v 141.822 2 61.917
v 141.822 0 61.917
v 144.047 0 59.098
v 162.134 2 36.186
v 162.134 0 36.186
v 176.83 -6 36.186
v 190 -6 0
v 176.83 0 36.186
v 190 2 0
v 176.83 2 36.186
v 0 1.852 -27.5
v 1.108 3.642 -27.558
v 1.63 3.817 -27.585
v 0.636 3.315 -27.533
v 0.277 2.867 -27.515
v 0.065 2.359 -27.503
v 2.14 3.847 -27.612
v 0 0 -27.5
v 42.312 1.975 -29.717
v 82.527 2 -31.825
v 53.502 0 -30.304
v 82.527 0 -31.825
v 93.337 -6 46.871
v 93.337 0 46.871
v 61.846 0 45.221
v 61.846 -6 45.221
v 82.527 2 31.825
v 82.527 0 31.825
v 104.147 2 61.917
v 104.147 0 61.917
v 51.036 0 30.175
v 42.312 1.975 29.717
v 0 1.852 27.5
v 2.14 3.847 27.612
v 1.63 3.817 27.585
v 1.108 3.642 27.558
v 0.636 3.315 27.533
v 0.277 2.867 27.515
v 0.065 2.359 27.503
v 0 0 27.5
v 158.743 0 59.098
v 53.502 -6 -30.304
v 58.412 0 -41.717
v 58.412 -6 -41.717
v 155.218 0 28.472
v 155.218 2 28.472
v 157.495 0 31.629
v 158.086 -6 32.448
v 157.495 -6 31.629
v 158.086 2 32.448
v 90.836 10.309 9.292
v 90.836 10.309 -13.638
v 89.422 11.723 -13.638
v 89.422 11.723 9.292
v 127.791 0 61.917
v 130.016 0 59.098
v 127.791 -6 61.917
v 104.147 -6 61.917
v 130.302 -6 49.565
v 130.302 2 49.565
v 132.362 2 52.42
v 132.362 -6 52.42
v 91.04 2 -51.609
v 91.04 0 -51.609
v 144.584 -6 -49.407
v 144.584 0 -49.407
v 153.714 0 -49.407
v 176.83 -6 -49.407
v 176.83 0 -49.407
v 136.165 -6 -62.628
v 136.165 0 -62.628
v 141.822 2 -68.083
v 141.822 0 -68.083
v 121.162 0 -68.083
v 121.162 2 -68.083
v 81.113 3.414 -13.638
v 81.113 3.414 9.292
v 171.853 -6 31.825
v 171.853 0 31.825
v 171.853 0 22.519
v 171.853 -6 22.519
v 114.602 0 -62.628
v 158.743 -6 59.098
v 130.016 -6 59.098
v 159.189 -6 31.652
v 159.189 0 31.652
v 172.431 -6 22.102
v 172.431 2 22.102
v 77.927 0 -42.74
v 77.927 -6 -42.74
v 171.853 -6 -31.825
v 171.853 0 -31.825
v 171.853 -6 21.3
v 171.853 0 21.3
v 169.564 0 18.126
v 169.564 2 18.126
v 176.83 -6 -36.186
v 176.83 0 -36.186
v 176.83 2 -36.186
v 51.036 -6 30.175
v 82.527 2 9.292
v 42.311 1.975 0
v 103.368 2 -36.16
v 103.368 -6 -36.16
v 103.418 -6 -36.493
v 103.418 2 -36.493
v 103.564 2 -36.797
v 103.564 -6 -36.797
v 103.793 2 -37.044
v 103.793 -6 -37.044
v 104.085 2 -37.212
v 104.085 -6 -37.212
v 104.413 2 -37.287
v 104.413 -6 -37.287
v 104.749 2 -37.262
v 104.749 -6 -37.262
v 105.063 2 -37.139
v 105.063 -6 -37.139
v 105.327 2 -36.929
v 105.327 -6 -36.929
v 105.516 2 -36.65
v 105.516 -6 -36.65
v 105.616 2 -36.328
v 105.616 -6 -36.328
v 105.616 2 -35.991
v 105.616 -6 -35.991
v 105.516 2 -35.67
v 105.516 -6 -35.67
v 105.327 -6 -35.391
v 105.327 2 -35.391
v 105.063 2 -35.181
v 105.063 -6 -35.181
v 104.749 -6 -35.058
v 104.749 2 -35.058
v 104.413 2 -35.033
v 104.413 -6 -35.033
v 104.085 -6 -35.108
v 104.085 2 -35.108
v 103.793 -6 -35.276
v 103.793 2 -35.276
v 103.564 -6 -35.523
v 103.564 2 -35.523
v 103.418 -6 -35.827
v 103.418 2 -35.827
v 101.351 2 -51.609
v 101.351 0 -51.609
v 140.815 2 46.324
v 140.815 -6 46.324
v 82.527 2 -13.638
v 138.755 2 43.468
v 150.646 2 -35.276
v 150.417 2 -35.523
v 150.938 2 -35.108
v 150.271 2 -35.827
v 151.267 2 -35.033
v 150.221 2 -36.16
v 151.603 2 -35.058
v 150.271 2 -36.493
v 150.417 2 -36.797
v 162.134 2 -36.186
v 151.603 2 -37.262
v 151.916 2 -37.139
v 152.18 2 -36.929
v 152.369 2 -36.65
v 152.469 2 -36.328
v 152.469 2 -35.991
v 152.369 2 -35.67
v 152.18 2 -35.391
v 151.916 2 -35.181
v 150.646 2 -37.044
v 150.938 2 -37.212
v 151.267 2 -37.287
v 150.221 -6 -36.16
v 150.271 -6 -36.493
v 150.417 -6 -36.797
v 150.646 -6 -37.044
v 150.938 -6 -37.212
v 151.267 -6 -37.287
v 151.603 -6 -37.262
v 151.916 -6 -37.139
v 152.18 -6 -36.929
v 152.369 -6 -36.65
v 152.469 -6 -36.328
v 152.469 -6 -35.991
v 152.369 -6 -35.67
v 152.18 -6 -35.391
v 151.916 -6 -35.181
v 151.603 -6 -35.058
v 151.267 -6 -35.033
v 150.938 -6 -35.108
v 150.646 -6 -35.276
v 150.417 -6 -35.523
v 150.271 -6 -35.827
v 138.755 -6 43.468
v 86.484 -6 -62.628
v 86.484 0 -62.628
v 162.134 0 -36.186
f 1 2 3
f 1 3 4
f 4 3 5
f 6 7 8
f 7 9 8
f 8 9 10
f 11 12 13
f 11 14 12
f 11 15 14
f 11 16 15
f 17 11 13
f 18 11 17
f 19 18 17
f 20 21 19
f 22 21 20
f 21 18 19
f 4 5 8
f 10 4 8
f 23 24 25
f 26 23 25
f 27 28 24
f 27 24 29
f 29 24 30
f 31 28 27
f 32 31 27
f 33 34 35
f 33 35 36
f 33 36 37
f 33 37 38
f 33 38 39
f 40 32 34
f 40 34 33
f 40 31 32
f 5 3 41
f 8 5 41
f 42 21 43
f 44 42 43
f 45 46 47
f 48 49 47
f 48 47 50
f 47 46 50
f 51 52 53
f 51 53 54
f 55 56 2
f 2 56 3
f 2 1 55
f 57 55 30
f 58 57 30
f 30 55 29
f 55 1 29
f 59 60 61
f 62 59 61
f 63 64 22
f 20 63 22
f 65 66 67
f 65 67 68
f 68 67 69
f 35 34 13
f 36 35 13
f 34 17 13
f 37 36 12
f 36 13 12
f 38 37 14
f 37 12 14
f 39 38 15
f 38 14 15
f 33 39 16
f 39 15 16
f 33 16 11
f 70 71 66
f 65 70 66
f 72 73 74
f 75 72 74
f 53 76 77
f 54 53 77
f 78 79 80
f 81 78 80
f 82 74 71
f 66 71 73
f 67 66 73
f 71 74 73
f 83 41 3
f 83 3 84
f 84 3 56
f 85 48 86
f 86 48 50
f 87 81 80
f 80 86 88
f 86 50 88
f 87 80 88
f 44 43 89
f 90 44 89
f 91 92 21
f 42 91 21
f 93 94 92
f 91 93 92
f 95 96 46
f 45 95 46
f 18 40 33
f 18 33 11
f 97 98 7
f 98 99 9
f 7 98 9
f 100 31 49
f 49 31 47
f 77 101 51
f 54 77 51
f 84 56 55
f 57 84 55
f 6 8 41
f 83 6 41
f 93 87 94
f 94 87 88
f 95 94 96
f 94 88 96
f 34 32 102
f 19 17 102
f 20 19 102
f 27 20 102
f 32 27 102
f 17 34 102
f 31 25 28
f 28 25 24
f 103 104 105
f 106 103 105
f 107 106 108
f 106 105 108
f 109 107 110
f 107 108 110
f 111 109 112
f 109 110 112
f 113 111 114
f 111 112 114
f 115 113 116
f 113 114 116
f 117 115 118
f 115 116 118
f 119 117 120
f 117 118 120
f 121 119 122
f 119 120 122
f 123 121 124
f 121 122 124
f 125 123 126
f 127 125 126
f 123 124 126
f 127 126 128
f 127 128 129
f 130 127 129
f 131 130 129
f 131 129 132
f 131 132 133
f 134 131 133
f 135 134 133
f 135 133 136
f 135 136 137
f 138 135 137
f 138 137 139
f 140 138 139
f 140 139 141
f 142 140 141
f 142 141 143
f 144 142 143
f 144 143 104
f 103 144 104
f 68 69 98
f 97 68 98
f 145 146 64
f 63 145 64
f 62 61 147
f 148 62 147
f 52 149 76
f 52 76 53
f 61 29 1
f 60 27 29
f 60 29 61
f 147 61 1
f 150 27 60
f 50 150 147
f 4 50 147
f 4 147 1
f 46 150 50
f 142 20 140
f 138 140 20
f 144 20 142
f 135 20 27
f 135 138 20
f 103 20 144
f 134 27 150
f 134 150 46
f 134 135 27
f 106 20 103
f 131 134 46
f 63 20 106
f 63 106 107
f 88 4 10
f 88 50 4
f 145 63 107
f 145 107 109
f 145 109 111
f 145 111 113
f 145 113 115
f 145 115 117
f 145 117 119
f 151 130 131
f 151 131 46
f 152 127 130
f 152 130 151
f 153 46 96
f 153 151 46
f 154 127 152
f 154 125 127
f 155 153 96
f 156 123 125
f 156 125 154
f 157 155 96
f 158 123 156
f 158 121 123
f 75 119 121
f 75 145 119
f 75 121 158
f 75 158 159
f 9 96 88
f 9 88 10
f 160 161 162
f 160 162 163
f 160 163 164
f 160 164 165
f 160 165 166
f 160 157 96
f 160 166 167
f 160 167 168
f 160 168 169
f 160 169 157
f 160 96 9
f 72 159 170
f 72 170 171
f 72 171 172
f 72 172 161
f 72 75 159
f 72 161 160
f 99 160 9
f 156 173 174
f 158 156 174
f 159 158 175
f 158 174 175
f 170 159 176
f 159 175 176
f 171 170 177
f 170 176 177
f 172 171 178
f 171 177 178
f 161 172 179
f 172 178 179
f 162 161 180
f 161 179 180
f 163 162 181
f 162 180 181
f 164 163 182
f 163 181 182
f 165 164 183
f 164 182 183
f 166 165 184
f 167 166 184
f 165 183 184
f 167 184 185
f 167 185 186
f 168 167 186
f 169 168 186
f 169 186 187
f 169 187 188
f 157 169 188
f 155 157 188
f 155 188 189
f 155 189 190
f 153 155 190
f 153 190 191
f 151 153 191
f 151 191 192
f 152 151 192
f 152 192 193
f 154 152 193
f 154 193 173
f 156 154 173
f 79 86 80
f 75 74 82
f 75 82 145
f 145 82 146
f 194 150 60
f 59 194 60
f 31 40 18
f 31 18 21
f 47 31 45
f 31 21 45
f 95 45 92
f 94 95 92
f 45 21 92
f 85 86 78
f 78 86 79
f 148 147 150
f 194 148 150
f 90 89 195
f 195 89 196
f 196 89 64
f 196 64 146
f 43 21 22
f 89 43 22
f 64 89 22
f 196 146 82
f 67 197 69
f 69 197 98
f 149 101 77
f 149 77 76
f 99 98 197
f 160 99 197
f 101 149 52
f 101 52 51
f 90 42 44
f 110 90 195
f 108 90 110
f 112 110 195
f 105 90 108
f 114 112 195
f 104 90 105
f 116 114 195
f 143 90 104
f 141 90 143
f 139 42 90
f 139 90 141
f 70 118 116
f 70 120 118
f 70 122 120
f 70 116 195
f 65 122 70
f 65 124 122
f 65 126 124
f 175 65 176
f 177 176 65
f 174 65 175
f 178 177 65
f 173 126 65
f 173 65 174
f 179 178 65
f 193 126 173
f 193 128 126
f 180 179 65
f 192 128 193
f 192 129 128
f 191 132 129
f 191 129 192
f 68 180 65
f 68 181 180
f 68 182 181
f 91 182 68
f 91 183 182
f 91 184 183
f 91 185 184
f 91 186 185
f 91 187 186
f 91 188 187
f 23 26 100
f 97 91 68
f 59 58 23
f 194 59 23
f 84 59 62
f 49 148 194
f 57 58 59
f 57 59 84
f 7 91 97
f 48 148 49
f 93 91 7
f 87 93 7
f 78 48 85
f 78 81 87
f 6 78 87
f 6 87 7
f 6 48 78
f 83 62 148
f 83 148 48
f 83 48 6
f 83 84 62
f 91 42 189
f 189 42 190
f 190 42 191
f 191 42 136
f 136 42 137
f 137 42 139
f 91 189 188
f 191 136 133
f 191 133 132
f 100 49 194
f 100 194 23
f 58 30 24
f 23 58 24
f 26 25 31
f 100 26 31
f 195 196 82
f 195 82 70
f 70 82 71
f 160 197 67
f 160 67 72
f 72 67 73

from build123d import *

# Parameters (mm, degrees)
EXTRUDE_1_DEPTH          = 2
EXTRUDE_2_DEPTH          = 2
CUT_EXTRUDE_3_DEPTH      = 202.869395429
CUT_EXTRUDE_3_DEPTH_BACK = 202.869395429
FILLET_1_R               = 2
EXTRUDE_4_DEPTH          = 6
HOLE_WIZARD_4_40_2_D     = 2.2606
CUT_EXTRUDE_7_DEPTH      = 202.98824919
EXTRUDE_5_DEPTH          = 2


with BuildPart() as part:
    # 草图2 → 凸台-拉伸1 (new body)
    with BuildSketch(Plane(origin=(0, 0, 0), x_dir=(1, 0, 0), z_dir=(0, 1, 0))):
        Polygon((141.821582241, 68.082690978), (121.161879345, 68.082690978), (101.35099463, 51.608897425), (91.039832206, 51.608897425), (82.527346571, 31.825074964), (0, 27.5), (0, -27.5), (82.527346571, -31.825074964), (104.14664553, -61.917309022), (141.821582241, -61.917309022), (162.133732132, -36.18552755), (176.829545061, -36.18552755), (190, 0), (176.829545061, 36.18552755), (162.133732132, 36.18552755), align=None)
    extrude(amount=EXTRUDE_1_DEPTH)

    # 草图6 → 凸台-拉伸2 (add)
    with BuildSketch(Plane(origin=(0, 2, 0), x_dir=(1, 0, 0), z_dir=(0, 1, 0))):
        Polygon((82.527346571, 31.825074964), (82.527346571, -31.825074964), (0, -27.5), (0, 27.5), align=None)
    extrude(amount=EXTRUDE_2_DEPTH)

    # 草图7 → 切除-拉伸3 (cut, two sides: drawn at the far end of the back side and taken through both)
    with BuildSketch(Plane.XY.offset(-CUT_EXTRUDE_3_DEPTH_BACK)):
        with BuildLine():
            Line((82.527346571, 2), (82.527346571, 30.740821148))
            Line((82.527346571, 30.740821148), (0, 4))
            add(Edge.make_bspline(
                [(82.527346571, 2), (41.215261335, 1.001172546), (0, 4)],
                knots=[0, 0, 0, 1, 1, 1], degree=2))
        make_face()
    extrude(amount=CUT_EXTRUDE_3_DEPTH + CUT_EXTRUDE_3_DEPTH_BACK, mode=Mode.SUBTRACT)

    # 圆角1
    fillet_1_edges = [part.edges().sort_by_distance(p)[0] for p in [
        (0, 4, 13.75),
    ]]
    fillet(fillet_1_edges, radius=FILLET_1_R)

    # 草图13 → 凸台-拉伸4 (add)
    with BuildSketch(Plane.XZ):
        Polygon((53.501507434, -30.303895193), (58.412275987, -41.716986195), (77.926898746, -42.739704237), (86.484415452, -62.62818317), (136.164724768, -62.62818317), (144.584081331, -49.40685536), (176.829545061, -49.40685536), (176.829545061, -36.18552755), (190, 0), (176.829545061, 36.18552755), (158.743204348, 59.097615602), (130.016377906, 59.097615602), (127.790568727, 61.917309022), (104.14664553, 61.917309022), (93.336996051, 46.871191993), (61.845926158, 45.220814953), (51.036276678, 30.174697924), (171.852914921, 31.825074964), (171.852914921, -31.825074964), align=None)
    extrude(amount=EXTRUDE_4_DEPTH)

    # #4-40 螺纹孔2 (through all)
    with Locations(Plane(origin=(0, 2, 0), x_dir=(1, 0, 0), z_dir=(0, 1, 0))):
        with Locations((151.351021218, 36.159959894), (104.497931561, 36.159959894)):
            Hole(HOLE_WIZARD_4_40_2_D / 2)

    # 草图18 → 切除-拉伸7 (cut, through all)
    with BuildSketch(Plane(origin=(0, 2, 0), x_dir=(1, 0, 0), z_dir=(0, 1, 0))):
        Polygon((169.563862496, -18.125868021), (155.218286362, -28.471875769), (158.085778721, -32.447885738), (172.431354854, -22.101877989), align=None)
        Polygon((130.302091903, -49.564637909), (132.361562224, -52.420260001), (140.814695434, -46.323873151), (138.755225113, -43.468251059), align=None)
    extrude(amount=-CUT_EXTRUDE_7_DEPTH, mode=Mode.SUBTRACT)


with BuildPart() as body_2:
    # 草图23 → 凸台-拉伸5 (new body)
    with BuildSketch(Plane(origin=(40.263673286, -40.263673286, 0), x_dir=(0, 0, -1), z_dir=(-0.7071067811865488, 0.7071067811865464, 0))):
        Polygon((-9.292036768, -59.769859956), (13.638077716, -59.769859956), (13.638077716, -71.520555916), (-9.292036768, -71.520555916), (-9.292036768, -60.809778756), align=None)
    extrude(amount=EXTRUDE_5_DEPTH)


solid = Compound([part.part, body_2.part])
